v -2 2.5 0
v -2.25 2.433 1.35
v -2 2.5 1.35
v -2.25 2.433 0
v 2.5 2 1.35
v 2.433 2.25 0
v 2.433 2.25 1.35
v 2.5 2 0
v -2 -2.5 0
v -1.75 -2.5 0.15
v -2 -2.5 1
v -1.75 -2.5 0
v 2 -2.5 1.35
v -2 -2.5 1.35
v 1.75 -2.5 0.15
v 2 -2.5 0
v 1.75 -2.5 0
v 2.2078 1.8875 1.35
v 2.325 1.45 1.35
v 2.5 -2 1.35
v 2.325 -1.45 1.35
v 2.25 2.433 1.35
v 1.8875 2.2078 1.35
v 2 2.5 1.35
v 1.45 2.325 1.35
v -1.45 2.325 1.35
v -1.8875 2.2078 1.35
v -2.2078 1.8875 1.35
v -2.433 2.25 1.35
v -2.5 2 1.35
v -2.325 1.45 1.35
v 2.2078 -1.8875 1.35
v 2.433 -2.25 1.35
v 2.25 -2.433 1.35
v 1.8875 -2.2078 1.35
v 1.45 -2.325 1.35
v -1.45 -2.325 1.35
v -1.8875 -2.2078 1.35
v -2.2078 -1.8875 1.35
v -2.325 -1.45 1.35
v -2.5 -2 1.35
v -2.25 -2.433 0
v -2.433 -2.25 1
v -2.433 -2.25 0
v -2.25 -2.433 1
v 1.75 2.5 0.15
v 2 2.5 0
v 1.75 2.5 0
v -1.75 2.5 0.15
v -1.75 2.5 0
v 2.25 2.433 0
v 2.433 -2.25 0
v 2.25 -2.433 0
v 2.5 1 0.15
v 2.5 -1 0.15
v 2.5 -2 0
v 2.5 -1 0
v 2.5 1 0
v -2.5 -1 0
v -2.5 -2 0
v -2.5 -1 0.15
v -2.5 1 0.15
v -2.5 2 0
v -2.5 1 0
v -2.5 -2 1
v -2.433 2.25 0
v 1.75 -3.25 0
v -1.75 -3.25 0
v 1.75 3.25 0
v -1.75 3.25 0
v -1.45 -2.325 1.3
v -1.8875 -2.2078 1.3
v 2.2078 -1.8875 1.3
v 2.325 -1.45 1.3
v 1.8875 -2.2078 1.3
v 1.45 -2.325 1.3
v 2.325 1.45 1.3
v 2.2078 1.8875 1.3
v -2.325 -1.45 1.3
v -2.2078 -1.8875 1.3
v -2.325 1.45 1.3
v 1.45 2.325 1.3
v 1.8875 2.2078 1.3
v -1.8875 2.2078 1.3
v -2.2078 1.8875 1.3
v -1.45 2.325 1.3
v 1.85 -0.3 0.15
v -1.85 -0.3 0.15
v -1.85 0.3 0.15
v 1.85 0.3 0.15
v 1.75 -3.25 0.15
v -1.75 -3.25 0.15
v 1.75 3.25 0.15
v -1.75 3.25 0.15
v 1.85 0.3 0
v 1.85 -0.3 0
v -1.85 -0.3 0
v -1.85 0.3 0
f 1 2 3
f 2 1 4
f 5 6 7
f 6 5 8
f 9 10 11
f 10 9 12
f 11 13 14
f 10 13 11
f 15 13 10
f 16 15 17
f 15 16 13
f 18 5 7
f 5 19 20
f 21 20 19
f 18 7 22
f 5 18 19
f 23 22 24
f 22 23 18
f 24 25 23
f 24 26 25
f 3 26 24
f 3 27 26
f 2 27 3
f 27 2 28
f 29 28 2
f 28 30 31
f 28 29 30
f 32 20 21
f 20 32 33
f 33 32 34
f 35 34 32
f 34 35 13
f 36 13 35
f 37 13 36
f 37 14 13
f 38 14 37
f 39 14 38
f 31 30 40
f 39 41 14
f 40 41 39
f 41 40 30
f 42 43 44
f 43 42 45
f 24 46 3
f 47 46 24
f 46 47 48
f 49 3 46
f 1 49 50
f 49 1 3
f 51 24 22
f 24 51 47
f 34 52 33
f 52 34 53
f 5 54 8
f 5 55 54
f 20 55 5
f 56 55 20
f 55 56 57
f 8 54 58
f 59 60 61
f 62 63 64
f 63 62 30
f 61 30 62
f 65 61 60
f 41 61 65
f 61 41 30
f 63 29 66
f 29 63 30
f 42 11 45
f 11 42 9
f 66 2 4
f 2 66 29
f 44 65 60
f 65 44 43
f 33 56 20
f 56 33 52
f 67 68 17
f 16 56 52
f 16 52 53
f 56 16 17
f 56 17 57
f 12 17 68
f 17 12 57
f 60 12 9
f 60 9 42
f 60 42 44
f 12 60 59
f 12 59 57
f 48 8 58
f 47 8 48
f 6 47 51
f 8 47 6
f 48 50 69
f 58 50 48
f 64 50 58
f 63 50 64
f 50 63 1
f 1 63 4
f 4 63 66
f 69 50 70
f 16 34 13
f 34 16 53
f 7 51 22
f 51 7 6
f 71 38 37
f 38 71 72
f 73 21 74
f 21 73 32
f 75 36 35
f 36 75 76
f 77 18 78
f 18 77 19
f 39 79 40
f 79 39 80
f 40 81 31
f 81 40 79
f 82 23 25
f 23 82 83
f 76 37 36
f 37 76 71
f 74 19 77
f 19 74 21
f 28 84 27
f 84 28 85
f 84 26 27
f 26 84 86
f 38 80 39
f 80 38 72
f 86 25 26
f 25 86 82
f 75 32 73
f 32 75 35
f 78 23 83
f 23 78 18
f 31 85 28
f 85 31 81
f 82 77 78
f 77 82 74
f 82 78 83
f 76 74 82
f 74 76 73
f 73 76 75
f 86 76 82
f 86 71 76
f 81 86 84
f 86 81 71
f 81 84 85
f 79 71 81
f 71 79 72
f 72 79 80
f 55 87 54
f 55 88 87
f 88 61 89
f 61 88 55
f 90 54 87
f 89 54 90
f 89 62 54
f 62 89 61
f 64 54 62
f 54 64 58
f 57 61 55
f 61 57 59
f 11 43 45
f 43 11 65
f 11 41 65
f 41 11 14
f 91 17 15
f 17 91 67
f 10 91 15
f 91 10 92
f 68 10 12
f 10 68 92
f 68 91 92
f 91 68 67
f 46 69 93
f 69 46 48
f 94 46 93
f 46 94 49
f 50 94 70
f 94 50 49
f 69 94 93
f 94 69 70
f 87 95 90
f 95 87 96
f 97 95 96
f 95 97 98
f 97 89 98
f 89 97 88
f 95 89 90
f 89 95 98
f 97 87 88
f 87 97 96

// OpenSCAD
// file: ../../lib/geometric.scad
/*
    ~Geometric Lib
    
    Variety of geometric parts
*/

/*
    On plane cube
    
    Cube that is centered in X and Y and rests on the XY plane
    
    size - as cube
*/
module tcube(size){
    translate([0,0,size[2]/2]) cube(size, true);
}

/*
    Square based frustrated pyramid

    Centered on X and Y, rests on the XY plane

    w - Width in X
    d - Depth in Y
    h - Height in Z
    ratio - Ratio of size of the tip face to the base face
*/
module sq_pyr(w, d, h, ratio){
    resize([w,d,h]) rotate([0,0,45]){
        cylinder(h, d1=1, d2=ratio, $fn=4);
    }
}

/*
    Rounded cornered box

    Centered on X and Y, rests on the XY plane

    w - Width in X
    d - Depth in Y
    h - Height in Z
    cr - Corner ratio
*/
module rounded_box(w,d,h,cr){
    translate([0,0,h/2]) {
        minkowski() {
            cube([w-2*cr, d-2*cr, h/2], true);
            cylinder(h/2, cr, cr, true, $fn=12);
        }
    }
}

module wedge(w,d,h){
    resize([w,d,h])
      translate([1,0,0])
        rotate([0,-90,0])
          linear_extrude(1)
            polygon([[0,0],[0,1],[1,0]]);
}


module fwedge(w,d,h,td){
    wedge_d = (d-td)/2;
    translate([0,wedge_d,0]){
        translate([0,td,0])
          wedge(w,wedge_d,h);
        cube([w,td,h]);
        mirror([0,1,0])
          wedge(w,wedge_d,h);
    }
}
// main file
use <../../lib/geometric.scad>

h = 1.35;
w = 5.0;
cr = 0.5;

lens_w = 4.65;
lens_rad = 0.875;
render(){
    difference(){
        rounded_box(w,w,h,cr);
        translate([0,0,h-0.05]){
            rounded_box(lens_w, lens_w, 0.1, lens_rad);
        }
        tcube([5,2,0.15], true);
        translate([0,0,1]) linear_extrude(height=0.4) polygon([[-2.5, -2.0], [-2.5, -2.5], [-2.0, -2.5]]);
    }
    tcube([3.7, 0.6, 0.15]);
    for (i = [-1, 1]){
        translate([0,i*2.5,0]) tcube([3.5, 1.5, 0.15]);
    }
}
